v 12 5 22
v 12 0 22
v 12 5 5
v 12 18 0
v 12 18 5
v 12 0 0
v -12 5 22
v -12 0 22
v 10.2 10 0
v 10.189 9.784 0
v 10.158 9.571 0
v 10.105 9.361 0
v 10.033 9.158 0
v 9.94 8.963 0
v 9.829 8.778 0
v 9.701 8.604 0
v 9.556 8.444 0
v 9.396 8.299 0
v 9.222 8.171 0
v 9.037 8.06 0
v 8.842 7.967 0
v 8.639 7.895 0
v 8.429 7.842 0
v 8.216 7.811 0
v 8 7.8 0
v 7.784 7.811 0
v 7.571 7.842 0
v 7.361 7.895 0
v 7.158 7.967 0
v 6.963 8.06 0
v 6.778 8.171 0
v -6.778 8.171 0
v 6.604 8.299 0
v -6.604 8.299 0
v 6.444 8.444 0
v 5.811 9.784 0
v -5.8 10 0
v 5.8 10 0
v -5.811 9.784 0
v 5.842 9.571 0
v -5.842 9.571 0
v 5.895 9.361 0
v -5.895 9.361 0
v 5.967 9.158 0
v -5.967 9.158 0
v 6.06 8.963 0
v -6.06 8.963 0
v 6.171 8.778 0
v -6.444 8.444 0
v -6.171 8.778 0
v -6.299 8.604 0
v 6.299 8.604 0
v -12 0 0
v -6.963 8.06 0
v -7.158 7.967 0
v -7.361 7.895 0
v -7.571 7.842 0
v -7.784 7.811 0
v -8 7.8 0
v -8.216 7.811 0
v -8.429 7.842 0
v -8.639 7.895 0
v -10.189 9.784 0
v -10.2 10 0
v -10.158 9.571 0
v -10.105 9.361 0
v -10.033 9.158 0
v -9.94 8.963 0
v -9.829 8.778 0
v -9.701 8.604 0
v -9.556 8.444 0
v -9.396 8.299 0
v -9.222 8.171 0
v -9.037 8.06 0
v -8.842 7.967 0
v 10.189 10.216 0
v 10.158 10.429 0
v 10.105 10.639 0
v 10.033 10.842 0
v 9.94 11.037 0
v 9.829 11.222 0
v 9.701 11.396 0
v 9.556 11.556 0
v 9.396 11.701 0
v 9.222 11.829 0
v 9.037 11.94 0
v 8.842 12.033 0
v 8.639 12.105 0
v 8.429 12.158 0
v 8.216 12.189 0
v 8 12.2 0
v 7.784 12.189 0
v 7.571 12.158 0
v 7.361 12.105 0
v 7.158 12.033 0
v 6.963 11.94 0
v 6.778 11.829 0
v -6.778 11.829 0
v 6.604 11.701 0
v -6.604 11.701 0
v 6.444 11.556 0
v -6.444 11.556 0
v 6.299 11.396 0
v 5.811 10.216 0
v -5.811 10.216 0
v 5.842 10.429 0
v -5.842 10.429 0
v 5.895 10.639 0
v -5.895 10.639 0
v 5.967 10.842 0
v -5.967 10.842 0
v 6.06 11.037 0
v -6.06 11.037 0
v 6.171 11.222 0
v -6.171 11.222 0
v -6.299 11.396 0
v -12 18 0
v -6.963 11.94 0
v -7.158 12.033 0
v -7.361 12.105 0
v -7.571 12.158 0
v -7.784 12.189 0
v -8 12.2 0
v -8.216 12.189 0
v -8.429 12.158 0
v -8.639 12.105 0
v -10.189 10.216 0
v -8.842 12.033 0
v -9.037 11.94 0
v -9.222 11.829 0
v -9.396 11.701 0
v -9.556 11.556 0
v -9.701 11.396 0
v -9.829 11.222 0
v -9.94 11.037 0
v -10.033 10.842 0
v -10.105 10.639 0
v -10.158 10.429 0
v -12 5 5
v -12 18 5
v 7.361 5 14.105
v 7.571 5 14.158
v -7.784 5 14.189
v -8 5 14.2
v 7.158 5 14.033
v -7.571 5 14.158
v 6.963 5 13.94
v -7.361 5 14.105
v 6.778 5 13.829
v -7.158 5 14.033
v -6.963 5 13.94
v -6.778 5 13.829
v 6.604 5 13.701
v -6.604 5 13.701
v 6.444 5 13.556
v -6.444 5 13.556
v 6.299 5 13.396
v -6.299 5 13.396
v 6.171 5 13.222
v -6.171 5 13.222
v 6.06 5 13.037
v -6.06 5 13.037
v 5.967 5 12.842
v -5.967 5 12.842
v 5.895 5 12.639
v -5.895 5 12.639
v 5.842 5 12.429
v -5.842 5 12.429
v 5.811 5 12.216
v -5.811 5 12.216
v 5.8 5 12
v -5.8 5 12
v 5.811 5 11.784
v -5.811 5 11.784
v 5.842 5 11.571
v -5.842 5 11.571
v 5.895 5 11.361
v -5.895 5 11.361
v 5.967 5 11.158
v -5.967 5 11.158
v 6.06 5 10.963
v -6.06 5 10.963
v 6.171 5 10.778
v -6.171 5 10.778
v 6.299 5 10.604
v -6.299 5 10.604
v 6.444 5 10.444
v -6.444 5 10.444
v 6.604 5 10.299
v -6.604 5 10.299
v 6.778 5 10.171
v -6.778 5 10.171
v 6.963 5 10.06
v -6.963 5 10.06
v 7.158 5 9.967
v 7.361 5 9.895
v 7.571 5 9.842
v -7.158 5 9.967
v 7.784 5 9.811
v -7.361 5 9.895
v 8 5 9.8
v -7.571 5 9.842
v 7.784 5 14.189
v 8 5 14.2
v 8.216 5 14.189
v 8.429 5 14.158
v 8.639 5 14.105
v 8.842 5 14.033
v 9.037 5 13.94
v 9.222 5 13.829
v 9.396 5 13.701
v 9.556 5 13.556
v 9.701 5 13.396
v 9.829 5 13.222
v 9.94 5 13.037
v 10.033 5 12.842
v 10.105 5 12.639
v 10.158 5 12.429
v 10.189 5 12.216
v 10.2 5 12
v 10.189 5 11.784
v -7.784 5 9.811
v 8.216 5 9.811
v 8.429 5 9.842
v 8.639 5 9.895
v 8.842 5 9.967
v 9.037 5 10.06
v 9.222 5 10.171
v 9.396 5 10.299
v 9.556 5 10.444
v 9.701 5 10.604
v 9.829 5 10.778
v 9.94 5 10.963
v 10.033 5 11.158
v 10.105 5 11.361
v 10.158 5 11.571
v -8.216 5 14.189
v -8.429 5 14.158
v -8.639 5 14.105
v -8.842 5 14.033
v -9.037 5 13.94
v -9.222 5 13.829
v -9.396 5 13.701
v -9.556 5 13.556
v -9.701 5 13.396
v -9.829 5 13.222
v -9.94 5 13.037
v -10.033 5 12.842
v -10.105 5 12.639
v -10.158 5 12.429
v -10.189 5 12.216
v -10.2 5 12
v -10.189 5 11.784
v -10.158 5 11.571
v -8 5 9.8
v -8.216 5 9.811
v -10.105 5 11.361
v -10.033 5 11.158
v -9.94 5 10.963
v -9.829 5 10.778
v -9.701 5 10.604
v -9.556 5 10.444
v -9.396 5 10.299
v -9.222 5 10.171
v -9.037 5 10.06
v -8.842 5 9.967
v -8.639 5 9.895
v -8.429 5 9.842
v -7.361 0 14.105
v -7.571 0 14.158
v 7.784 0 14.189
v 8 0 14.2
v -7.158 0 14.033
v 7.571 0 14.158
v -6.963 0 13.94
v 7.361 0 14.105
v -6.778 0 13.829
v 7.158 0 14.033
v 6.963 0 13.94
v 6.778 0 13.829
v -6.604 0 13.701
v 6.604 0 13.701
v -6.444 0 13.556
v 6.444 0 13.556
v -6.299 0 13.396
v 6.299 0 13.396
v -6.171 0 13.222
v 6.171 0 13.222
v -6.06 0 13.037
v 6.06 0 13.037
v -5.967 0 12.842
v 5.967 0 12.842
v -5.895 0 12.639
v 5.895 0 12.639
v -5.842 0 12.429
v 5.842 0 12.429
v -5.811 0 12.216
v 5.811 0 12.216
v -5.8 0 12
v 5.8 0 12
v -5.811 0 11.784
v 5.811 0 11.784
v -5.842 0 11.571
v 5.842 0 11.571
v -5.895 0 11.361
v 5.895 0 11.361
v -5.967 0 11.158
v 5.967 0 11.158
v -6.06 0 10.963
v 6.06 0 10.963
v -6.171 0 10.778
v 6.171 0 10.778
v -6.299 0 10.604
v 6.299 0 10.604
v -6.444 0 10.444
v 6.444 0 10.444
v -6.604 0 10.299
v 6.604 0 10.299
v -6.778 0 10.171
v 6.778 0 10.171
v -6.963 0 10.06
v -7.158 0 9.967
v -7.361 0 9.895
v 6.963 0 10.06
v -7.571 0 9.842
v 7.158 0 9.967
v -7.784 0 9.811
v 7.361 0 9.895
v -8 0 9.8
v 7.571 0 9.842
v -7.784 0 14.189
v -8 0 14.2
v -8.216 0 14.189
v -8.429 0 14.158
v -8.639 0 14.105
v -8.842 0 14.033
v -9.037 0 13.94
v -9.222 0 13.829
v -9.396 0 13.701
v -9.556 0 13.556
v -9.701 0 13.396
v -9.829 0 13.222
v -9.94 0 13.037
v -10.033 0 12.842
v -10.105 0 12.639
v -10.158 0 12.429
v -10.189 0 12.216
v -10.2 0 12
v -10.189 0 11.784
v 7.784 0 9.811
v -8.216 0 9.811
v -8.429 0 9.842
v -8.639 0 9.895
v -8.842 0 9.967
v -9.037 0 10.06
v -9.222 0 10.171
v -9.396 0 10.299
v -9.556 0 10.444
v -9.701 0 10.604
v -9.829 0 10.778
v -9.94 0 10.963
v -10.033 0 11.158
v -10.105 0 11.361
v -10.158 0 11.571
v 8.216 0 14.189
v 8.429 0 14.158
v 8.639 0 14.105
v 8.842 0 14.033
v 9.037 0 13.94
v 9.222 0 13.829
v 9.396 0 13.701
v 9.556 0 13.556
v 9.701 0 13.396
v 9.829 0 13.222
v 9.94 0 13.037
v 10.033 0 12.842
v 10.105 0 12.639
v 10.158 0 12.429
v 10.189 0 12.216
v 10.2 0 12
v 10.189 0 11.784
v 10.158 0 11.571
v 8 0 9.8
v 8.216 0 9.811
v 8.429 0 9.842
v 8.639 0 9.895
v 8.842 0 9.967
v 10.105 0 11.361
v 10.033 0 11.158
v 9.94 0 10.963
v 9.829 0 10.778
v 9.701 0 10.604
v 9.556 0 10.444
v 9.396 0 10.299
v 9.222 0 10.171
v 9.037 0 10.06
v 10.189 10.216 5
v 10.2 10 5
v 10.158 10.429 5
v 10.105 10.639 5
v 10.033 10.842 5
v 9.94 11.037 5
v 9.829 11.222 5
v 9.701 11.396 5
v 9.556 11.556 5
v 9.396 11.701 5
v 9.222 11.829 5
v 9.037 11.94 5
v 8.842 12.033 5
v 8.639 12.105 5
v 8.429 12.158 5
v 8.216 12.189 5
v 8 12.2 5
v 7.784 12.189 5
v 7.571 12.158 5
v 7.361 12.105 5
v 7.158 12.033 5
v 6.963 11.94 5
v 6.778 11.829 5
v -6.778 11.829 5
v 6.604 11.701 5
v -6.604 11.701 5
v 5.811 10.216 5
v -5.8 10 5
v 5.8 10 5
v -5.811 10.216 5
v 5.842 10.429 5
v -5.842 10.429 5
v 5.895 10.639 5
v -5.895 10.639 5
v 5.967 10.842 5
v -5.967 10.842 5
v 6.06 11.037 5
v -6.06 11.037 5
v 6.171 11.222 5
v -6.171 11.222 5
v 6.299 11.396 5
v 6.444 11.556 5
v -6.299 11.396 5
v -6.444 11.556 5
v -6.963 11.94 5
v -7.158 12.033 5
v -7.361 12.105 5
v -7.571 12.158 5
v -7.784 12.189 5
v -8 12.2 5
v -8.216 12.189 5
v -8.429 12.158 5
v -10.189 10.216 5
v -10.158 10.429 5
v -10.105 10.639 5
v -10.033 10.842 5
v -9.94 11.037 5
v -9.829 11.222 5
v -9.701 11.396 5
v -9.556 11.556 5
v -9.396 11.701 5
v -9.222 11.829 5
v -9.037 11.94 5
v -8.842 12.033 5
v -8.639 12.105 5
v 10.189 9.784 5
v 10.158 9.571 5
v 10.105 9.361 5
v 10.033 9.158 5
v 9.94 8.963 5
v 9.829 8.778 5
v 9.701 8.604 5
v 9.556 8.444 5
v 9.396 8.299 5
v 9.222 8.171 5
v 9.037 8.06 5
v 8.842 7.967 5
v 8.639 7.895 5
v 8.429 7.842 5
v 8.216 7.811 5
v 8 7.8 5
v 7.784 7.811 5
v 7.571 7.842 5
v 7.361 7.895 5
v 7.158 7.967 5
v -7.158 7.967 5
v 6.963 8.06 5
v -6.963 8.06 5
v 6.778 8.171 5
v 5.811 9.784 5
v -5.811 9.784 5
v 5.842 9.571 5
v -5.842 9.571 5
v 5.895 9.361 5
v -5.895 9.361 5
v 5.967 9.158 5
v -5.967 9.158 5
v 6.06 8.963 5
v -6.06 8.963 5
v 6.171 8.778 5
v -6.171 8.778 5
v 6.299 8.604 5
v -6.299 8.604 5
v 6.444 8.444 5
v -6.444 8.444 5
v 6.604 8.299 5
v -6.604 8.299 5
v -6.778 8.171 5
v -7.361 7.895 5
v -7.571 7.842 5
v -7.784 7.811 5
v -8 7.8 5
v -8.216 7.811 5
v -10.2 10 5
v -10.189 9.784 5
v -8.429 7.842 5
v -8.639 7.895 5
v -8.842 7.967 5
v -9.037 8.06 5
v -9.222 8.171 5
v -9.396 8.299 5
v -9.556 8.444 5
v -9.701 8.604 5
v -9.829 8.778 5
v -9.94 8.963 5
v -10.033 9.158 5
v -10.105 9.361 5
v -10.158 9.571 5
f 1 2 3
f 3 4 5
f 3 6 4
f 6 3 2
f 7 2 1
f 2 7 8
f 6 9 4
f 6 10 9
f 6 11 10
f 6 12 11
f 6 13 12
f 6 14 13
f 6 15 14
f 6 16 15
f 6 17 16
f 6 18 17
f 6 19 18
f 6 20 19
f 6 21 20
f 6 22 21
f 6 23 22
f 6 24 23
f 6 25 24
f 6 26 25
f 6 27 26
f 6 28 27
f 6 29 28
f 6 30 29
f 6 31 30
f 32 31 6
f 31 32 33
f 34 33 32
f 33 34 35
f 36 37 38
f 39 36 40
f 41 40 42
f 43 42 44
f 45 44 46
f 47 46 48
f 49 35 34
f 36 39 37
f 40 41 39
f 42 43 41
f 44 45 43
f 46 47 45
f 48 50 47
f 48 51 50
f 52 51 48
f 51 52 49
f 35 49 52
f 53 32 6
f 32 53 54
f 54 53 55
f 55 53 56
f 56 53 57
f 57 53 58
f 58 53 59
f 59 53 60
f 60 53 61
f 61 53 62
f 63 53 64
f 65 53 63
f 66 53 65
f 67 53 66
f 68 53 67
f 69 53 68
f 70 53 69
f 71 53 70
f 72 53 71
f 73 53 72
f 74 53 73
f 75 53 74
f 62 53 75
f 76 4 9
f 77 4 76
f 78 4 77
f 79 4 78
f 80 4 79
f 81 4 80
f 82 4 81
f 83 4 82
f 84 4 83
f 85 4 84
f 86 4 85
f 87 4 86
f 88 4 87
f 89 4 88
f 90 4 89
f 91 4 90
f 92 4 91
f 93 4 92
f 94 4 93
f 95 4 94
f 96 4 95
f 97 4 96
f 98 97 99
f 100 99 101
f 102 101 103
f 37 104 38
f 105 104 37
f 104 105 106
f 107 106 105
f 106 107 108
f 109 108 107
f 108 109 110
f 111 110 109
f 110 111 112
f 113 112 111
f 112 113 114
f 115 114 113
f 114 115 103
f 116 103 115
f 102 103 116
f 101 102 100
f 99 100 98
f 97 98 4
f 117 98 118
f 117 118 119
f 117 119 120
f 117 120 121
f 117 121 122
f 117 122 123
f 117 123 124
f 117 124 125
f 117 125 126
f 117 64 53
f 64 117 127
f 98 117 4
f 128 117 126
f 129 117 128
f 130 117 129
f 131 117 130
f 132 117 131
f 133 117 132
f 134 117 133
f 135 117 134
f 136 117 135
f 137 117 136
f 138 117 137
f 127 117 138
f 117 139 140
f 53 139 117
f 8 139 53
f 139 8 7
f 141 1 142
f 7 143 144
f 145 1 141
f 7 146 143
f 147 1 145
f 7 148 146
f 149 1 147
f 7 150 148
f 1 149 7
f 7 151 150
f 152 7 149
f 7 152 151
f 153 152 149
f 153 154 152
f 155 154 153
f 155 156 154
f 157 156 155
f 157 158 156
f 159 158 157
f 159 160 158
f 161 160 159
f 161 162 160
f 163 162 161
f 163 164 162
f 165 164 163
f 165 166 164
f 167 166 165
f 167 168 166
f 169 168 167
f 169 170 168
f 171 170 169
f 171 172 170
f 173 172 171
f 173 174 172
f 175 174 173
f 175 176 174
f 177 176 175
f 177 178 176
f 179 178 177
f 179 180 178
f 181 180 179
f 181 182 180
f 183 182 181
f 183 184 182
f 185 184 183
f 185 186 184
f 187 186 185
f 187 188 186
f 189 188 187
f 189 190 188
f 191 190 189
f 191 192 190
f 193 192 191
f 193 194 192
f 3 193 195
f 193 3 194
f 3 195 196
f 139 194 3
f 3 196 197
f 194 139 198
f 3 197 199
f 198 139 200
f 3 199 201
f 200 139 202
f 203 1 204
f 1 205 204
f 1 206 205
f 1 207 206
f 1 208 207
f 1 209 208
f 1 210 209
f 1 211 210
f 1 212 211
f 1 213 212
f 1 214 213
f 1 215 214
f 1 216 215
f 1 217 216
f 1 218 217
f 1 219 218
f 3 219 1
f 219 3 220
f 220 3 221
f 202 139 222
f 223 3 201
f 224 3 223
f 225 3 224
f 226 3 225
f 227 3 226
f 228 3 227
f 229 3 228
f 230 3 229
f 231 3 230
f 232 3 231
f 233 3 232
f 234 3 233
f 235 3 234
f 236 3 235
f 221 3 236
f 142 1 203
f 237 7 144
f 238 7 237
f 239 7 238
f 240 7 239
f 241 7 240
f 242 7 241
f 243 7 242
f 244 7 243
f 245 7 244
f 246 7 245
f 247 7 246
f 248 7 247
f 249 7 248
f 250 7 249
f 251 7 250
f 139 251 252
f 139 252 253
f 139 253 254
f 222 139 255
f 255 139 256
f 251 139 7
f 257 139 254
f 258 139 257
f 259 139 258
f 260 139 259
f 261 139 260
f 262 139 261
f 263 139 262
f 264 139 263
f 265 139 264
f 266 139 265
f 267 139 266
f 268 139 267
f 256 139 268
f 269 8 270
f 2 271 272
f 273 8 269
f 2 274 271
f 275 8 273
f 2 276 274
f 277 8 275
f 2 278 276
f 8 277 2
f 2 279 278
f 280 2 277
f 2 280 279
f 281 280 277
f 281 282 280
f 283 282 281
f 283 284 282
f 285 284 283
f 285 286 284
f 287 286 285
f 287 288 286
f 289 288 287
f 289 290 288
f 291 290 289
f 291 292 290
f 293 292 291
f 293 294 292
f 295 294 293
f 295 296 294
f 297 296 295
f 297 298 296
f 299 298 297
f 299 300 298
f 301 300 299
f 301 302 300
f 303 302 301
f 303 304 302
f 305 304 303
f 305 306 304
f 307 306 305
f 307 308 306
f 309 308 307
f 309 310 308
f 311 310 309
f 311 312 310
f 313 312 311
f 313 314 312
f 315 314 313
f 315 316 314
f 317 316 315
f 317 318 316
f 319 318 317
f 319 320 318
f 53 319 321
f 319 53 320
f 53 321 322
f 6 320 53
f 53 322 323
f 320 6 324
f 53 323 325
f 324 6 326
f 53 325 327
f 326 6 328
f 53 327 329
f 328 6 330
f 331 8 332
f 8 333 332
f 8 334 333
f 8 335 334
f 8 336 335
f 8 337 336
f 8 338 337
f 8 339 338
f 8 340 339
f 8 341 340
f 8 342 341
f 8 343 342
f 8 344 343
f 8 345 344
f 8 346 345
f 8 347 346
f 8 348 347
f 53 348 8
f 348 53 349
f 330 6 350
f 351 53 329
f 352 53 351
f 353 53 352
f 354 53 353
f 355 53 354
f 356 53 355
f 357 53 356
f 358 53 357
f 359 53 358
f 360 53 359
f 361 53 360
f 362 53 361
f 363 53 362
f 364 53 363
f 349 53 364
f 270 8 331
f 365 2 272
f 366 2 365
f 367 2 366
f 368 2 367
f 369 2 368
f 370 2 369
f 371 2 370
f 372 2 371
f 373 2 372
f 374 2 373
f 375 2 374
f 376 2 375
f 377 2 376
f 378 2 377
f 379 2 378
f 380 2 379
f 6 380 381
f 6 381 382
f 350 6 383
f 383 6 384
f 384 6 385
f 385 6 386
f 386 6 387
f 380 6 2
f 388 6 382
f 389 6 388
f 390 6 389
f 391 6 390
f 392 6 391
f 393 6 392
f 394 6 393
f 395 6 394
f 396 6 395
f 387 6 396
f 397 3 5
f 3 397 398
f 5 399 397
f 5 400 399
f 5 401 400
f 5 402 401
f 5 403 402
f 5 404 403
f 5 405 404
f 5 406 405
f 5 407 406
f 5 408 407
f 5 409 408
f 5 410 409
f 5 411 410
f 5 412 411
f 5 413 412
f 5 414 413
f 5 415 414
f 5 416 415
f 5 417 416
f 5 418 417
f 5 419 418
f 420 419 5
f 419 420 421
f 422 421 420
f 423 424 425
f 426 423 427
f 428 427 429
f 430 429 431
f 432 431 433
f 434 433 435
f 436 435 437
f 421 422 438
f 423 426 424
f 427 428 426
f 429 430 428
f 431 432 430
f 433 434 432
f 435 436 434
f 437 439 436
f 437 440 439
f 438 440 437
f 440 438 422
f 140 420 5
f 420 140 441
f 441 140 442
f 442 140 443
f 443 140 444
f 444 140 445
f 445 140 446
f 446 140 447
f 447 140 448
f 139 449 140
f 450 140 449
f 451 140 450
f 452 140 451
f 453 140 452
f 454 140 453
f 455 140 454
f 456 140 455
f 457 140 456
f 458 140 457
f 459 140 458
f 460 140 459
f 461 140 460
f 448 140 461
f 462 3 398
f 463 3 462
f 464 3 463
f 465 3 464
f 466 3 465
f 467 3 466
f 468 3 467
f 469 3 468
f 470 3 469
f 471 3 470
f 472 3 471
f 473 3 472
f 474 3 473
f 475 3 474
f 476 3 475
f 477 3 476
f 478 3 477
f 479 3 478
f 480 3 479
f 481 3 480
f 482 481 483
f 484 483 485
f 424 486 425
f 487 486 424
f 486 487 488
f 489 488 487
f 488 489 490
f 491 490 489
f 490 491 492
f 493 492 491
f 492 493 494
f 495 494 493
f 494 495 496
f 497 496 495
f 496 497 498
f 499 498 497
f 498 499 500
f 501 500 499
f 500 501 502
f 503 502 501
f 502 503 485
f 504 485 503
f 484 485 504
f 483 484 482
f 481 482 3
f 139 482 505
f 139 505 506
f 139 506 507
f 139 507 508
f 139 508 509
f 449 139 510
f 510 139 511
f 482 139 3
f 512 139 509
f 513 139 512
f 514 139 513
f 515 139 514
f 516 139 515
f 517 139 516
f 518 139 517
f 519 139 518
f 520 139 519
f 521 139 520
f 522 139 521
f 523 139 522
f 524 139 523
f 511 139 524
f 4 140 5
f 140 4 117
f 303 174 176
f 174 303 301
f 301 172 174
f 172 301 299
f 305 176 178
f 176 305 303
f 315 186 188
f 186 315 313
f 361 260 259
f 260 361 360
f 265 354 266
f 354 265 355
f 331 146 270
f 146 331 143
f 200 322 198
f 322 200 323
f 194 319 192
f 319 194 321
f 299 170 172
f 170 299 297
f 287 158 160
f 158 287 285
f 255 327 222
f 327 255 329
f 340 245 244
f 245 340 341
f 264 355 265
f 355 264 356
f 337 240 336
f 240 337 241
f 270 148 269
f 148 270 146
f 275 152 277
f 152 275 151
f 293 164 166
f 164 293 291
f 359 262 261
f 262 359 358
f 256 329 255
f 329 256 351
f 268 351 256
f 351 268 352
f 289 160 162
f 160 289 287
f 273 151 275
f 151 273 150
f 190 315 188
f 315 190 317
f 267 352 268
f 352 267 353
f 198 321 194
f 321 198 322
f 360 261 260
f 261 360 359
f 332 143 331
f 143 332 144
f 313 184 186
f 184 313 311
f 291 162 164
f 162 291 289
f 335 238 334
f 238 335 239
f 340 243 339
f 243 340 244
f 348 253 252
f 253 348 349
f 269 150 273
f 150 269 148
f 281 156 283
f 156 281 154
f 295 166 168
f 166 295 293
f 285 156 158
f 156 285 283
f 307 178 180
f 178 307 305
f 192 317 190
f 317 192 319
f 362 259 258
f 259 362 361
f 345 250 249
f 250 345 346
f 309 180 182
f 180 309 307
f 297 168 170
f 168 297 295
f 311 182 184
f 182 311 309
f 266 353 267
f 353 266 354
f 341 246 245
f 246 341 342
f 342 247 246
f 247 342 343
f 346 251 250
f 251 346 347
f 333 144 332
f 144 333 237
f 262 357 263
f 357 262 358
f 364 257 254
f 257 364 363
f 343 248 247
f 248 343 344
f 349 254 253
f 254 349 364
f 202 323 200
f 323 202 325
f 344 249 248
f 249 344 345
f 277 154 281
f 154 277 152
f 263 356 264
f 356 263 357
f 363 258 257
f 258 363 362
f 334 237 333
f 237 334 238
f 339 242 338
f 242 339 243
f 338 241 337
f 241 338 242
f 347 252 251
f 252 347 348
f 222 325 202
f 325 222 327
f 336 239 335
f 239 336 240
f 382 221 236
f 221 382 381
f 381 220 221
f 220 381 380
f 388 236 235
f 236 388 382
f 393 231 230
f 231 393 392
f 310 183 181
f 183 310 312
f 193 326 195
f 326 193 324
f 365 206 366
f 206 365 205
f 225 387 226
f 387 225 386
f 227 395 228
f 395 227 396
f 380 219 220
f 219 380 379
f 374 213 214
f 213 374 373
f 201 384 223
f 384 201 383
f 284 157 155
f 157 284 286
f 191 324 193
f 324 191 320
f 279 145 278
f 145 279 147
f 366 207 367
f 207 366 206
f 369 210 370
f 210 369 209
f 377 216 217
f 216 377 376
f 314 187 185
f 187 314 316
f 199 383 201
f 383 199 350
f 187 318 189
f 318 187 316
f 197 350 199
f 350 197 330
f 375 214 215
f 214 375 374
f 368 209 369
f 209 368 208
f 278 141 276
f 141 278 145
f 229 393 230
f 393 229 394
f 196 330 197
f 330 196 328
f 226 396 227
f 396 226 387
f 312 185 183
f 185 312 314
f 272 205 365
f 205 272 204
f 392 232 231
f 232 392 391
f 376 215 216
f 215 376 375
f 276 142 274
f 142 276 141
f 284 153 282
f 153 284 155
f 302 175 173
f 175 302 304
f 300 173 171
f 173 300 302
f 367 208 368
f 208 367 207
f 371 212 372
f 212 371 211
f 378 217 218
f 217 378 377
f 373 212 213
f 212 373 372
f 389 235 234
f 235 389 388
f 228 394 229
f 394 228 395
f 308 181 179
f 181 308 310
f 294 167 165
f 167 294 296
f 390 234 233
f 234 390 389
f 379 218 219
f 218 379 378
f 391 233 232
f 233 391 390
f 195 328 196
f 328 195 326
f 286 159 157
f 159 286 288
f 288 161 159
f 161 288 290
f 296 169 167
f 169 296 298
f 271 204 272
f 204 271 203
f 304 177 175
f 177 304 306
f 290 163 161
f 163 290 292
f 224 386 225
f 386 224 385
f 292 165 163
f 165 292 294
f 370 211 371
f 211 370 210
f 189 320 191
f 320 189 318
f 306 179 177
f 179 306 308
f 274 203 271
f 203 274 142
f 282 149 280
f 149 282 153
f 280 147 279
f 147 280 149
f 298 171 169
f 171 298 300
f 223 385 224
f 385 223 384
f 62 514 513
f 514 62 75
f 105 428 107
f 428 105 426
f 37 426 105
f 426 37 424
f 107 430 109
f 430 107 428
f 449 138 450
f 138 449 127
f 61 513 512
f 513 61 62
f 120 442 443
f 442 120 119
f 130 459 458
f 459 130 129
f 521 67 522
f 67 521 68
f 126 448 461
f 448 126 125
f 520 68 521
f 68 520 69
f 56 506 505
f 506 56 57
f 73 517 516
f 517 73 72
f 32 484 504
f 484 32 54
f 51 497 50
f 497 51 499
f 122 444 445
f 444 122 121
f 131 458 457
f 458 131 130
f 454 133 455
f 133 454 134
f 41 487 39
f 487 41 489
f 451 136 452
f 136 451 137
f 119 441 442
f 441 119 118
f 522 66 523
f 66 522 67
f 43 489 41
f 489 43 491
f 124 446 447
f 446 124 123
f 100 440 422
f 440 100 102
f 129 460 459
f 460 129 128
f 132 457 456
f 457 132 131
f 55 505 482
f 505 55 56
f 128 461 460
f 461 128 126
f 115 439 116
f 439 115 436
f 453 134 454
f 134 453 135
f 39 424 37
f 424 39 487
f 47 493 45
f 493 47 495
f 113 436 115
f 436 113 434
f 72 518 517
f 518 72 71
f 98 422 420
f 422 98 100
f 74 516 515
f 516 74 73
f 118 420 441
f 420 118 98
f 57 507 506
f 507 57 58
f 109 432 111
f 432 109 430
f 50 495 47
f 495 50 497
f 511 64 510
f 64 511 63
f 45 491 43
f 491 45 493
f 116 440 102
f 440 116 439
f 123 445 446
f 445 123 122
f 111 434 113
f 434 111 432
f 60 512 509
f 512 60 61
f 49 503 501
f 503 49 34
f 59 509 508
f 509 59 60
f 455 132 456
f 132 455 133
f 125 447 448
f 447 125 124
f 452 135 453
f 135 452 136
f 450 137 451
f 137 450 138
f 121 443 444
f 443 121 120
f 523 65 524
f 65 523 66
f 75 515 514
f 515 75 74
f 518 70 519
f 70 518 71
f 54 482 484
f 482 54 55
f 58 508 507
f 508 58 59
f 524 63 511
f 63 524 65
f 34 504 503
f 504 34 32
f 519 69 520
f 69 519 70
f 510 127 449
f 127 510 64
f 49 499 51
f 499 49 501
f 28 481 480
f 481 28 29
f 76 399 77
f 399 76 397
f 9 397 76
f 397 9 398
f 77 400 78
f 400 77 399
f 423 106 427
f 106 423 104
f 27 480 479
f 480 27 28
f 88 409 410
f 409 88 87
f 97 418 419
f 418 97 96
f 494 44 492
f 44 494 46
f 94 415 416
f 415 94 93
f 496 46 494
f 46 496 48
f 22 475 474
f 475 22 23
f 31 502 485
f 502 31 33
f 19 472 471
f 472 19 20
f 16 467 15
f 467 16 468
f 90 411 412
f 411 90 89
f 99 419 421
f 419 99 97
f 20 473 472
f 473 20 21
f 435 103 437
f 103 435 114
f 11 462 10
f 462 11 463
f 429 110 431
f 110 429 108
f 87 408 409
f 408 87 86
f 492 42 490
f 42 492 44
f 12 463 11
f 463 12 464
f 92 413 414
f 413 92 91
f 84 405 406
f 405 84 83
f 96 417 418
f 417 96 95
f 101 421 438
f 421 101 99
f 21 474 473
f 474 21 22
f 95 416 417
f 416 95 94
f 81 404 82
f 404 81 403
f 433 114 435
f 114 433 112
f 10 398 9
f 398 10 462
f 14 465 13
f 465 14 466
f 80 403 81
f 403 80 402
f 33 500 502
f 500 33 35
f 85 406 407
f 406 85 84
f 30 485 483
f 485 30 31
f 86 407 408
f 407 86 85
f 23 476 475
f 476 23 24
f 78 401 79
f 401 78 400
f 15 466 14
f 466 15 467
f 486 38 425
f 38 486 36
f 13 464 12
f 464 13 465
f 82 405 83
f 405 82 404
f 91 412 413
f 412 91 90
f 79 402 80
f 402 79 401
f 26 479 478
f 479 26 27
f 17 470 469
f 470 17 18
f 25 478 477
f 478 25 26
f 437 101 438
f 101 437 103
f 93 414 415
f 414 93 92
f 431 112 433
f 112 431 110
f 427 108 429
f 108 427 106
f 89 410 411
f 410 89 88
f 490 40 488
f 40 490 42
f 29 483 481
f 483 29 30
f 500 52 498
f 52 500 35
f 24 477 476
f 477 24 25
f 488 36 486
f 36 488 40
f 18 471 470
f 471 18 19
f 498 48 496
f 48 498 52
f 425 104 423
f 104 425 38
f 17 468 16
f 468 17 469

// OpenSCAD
// file: ../lib/utils.scad
// 공통 모듈 (common modules) — 베어링 시트, 볼트 홀 등
include <../config/parameters.scad>

// 베어링 시트 (bearing seat): 압입 공차 적용 포켓
// brg = [내경, 외경, 폭] (예: BRG_608ZZ)
module bearing_seat(brg) {
    cylinder(d = brg[1] + bearing_press_fit, h = brg[2]);
}

// 베어링 시트 + 내륜 도피 홀 (관통)
// wall = 시트 아래 받침 두께
module bearing_pocket(brg, wall = 2) {
    union() {
        translate([0, 0, wall]) bearing_seat(brg);
        // 내륜 접촉 방지: 내경보다 크고 외경보다 작은 도피 홀
        cylinder(d = (brg[0] + brg[1]) / 2, h = wall + 0.1);
    }
}

// 관통 볼트 홀 (clearance hole)
module bolt_hole(d, h) {
    cylinder(d = d + bolt_hole_oversize, h = h);
}

// NEMA 17 모터 마운트 홀 패턴 (CON-004: SF24 = 42각 NEMA 17 호환)
// h = 판 두께
module nema17_mount(h) {
    union() {
        cylinder(d = nema17_pilot_d + clearance_fit, h = h);
        for (x = [-1, 1], y = [-1, 1])
            translate([x * nema17_hole_pitch / 2, y * nema17_hole_pitch / 2, 0])
                bolt_hole(nema17_bolt_d, h);
    }
}

// 숄더 볼트 피벗 홀 (CON-001)
// d = 숄더 직경 (shoulder_d_large)
module pivot_hole(d, h) {
    cylinder(d = d + clearance_fit, h = h);
}

// 베어링 보스 (bearing boss): 출력물 허브에 베어링 내경 직접 안착 (CON-003)
// 내경 기준 압입 — bearing_press_fit(음수)만큼 키운다
module bearing_boss(brg, h) {
    cylinder(d = brg[0] - bearing_press_fit, h = h);
}

// 육각 너트 포켓 (nut pocket) — 차집합용. af = 평면폭(across flats)
module nut_pocket(af, t) {
    cylinder(d = (af + clearance_fit) / cos(30), h = t, $fn = 6);
}

// 리미트 스위치 장착 홀 쌍 (ELE-004) — 차집합용, X축 방향 피치
module ls_mount_holes(h) {
    for (x = [-1, 1])
        translate([x * ls_hole_pitch / 2, 0, 0])
            cylinder(d = ls_hole_d, h = h);
}

// 케이블 가이드 클립 (ELE-005) — 외면 부착형 C-클립, cable_d 다발 직경
module cable_clip(cable_d = 8, t = 4) {
    wall = 2.5;
    difference() {
        cylinder(d = cable_d + 2 * wall, h = t);
        translate([0, 0, -0.1]) cylinder(d = cable_d, h = t + 0.2);
        // 삽입 개구 (개구 폭 = 케이블 직경의 70%)
        translate([0, -cable_d * 0.35, -0.1])
            cube([cable_d, cable_d * 0.7, t + 0.2]);
    }
}

// 선택 색상 래퍼. parts 레이어는 상수를 모르고 전달받은 col만 적용한다.
module apply_part_color(col = undef) {
    if (is_undef(col)) children();
    else color(col) children();
}

// 지시선(leader) + 빌보드(billboard) 라벨 — 프리뷰용, $vpr 카메라 추종
// p = 앵커(부품 측), v = 지시선 벡터 (라벨은 p+v 위치)
// 주의: 상위 프레임이 회전된 경우 빌보드가 카메라를 향하지 않음 — 월드 프레임에서 호출할 것
module leader_label(p, v, txt, size = 3.2, col = "white", line_d = 1.4) {
    color(col) {
        hull() {
            translate(p) sphere(d = line_d, $fn = 12);
            translate(p + v) sphere(d = line_d, $fn = 12);
        }
        translate(p + v) rotate($vpr) translate([2, -size / 2, 0])
            linear_extrude(0.6) text(txt, size = size);
    }
}

// 꺾임 무릎 높이 (팔레타이저 오프셋) — pos·(1-pos)·L·tan(bend) 근사 정의
function knee_h(L, pos, bend) = pos * (1 - pos) * L * tan(bend);

// 꺾임 빔 측판 외형 2D — 러그 3원 hull (무릎 = 현 위쪽 +y).
// 창 없는 충전 단면: 볼록 껍질이라 현 아래 모서리는 직선 (스탠드오프 벨트)
module bent_beam2d(L, pos, bend, r) {
    hull() {
        circle(r = r);
        translate([pos * L, knee_h(L, pos, bend)]) circle(r = r);
        translate([L, 0]) circle(r = r);
    }
}

// 환형 섹터 2D (아크 슬롯 차집합용) — a0 → a1 (deg, 반시계)
module annulus_sector2d(r_in, r_out, a0, a1) {
    n = max(8, ceil(64 * (a1 - a0) / 360));
    polygon(concat(
        [for (i = [0 : n]) let (a = a0 + (a1 - a0) * i / n)
            r_out * [cos(a), sin(a)]],
        [for (i = [n : -1 : 0]) let (a = a0 + (a1 - a0) * i / n)
            r_in * [cos(a), sin(a)]]));
}

// 플랜지 커플러 장착 컷 (구동 부품 z0 자유면, 차집합용) — 분할 클램프 대체.
// 평 플랜지(스피곳 없음) → 중앙 축-팁 도피(관통) + 플랜지 셀프태핑 볼트 ×n(블라인드)
module coupler_mount_cut(plate_t) {
    translate([0, 0, -0.1])
        cylinder(d = cpl_bore + clearance_fit + 0.6, h = plate_t + 0.2); // 축 팁
    bdepth = min(plate_t - 1, 6);
    for (i = [0 : cpl_bolt_n - 1])
        rotate([0, 0, 45 + i * 360 / cpl_bolt_n])
            translate([cpl_bolt_r, 0, -0.05])
                cylinder(d = cpl_bolt_d - 0.4, h = bdepth + 0.05);  // M3 셀프태핑
}

// 축 클램프 슬릿 + M3 핀치 볼트 (차집합용) — [유산: 분할 클램프 방식, 현재 미사용]
// bore_d = 클램프 보어, depth = 보어 깊이, body_d = 보스 외경
module shaft_clamp_cut(bore_d, depth, body_d) {
    union() {
        cylinder(d = bore_d + clearance_fit / 2, h = depth);
        // 슬릿
        translate([-1, 0, -0.1]) cube([2, body_d / 2 + 1, depth + 0.1]);
        // M3 핀치 볼트 (슬릿 직교) — 보어 반경과 보스 반경 사이
        translate([0, (bore_d / 2 + body_d / 2) / 2 + 1, depth / 2])
            rotate([0, 90, 0])
                translate([0, 0, -body_d / 2 - 1])
                    bolt_hole(3, body_d + 2);
    }
}
// main file
// 타워 풋 브래킷 (foot bracket) — L자, ×4 동일
// =====================================================================
// 수직 레그 = 타워 내면에 M4 ×2 관통(타워 외면 너트),
// 수평 레그 = 터릿 상면에 M4 ×2 관통(터릿 하면 너트).
// 좌표: x = 폭 중심, y0 = 타워 내면 (+y 안쪽), z0 = 터릿 상면
// 출력: 측면 눕힘 — 서포트 불요 (MFG-003)
include <../config/parameters.scad>
use <../lib/utils.scad>

module foot_bracket(col = undef) {
    apply_part_color(col) difference() {
        union() {
            // 수직 레그 (타워 접촉면 y0)
            translate([-foot_w / 2, 0, 0])
                cube([foot_w, tower_foot_t, foot_leg_h]);
            // 수평 레그 (터릿 접촉면 z0)
            translate([-foot_w / 2, 0, 0])
                cube([foot_w, foot_leg_d, tower_foot_t]);
        }
        // 타워 체결 M4 ×2
        for (s = [-1, 1])
            translate([s * foot_bolt_pitch / 2, -0.1, foot_bolt_z])
                rotate([-90, 0, 0]) bolt_hole(4, tower_foot_t + 0.2);
        // 터릿 체결 M4 ×2
        for (s = [-1, 1])
            translate([s * foot_bolt_pitch / 2, foot_bolt_inset, -0.1])
                bolt_hole(4, tower_foot_t + 0.2);
    }
}

foot_bracket();
